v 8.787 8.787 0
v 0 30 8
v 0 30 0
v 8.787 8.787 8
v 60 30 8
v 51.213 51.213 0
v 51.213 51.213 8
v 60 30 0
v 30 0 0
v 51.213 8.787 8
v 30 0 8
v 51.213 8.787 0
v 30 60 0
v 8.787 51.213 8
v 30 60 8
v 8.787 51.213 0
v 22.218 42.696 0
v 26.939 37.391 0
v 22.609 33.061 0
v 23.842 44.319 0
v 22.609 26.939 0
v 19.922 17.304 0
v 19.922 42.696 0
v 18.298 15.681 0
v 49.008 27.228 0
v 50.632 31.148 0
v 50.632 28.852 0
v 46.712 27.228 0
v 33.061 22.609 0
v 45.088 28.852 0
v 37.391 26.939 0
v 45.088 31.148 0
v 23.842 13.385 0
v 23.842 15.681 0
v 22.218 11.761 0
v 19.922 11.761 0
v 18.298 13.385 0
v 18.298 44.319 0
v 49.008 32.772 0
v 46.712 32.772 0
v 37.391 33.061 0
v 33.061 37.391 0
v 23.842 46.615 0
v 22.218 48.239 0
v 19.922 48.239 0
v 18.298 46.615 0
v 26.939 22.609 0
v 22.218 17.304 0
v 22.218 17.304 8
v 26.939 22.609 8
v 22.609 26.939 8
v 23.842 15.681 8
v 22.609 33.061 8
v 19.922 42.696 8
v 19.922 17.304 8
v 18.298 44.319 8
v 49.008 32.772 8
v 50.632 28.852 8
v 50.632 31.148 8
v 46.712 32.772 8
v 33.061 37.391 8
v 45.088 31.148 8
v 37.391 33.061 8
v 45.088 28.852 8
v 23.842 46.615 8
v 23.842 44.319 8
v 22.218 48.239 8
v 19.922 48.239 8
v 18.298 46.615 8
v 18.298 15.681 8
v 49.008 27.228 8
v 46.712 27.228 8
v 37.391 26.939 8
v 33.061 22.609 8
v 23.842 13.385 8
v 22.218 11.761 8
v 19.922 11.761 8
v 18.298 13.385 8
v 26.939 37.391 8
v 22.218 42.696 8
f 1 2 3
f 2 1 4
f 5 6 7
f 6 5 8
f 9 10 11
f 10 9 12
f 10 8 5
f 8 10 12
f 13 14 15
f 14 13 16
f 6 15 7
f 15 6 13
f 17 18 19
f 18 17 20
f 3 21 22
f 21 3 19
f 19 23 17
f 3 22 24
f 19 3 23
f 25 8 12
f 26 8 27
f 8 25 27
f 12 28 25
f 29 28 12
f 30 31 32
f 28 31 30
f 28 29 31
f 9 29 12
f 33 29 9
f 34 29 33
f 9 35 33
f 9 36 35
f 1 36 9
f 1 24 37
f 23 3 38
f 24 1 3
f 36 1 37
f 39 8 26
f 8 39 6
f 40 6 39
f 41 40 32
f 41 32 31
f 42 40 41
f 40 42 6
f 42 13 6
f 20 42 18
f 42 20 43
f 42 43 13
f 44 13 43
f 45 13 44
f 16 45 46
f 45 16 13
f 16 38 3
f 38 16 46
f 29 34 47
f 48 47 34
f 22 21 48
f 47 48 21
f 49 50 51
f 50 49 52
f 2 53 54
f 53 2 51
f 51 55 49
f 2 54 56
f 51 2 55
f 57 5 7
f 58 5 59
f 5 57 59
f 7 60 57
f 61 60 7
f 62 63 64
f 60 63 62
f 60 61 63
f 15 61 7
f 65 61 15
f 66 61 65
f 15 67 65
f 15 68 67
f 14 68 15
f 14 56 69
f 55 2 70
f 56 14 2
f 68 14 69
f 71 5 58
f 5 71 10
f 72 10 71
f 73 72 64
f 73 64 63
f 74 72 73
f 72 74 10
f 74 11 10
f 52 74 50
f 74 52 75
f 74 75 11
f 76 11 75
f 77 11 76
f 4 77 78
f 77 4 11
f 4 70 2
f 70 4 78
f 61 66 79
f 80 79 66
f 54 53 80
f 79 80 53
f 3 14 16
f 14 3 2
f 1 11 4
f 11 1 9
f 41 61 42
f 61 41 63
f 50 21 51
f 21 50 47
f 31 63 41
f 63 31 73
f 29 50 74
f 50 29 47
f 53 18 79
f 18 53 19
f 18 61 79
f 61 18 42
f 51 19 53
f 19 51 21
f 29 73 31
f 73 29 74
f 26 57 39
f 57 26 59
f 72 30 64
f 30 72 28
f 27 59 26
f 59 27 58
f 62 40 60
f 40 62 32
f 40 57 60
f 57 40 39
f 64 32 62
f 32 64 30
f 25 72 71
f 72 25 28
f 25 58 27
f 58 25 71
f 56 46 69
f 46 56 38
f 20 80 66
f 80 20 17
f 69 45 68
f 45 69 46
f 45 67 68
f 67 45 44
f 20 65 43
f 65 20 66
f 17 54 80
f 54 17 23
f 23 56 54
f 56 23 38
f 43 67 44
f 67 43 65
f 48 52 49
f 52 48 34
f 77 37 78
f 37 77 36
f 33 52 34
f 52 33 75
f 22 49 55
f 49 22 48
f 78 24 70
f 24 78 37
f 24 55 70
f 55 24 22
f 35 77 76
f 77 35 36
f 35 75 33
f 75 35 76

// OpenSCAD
$fn = 32;

// ----------------------------------------------------------------------
// Polygon plate: 8-gon R30, 3 bolt windows
// ----------------------------------------------------------------------

// --- parameters (mm) ---
sides = 8;                // number of polygon sides
plate_r = 30;             // circumscribed radius of the polygon
bore_r = 8;               // centre bore radius
bolts = 3;                // number of bolt windows
ring_r = 17.86;           // bolt-circle radius
bolt_r = 3;               // bolt window radius
plate_t = 8;              // plate thickness, Z (extrusion height)

plate_d = 2 * plate_r;  // circumscribed diameter
bore_d = 2 * bore_r;  // centre bore diameter
bolt_d = 2 * bolt_r;  // bolt window diameter
ring_d = 2 * ring_r;  // bolt-circle diameter

profile = [[60, 30], [51.213, 51.213], [30, 60], [8.787, 51.213], [0, 30], [8.787, 8.787], [30, 0], [51.213, 8.787]];  // primary outline, 8 points, counter clockwise
void_1 = [[37.391, 33.061], [33.061, 37.391], [26.939, 37.391], [22.609, 33.061], [22.609, 26.939], [26.939, 22.609], [33.061, 22.609], [37.391, 26.939]];  // centre bore, 8 points
void_2 = [[50.632, 31.148], [49.008, 32.772], [46.712, 32.772], [45.088, 31.148], [45.088, 28.852], [46.712, 27.228], [49.008, 27.228], [50.632, 28.852]];  // bolt window 1, 8 points
void_3 = [[23.842, 46.615], [22.218, 48.239], [19.922, 48.239], [18.298, 46.615], [18.298, 44.319], [19.922, 42.696], [22.218, 42.696], [23.842, 44.319]];  // bolt window 2, 8 points
void_4 = [[23.842, 15.681], [22.218, 17.304], [19.922, 17.304], [18.298, 15.681], [18.298, 13.385], [19.922, 11.761], [22.218, 11.761], [23.842, 13.385]];  // bolt window 3, 8 points

// --- the one profile operation ---
difference() {
  linear_extrude(height = plate_t) polygon(points = profile);
  translate([0, 0, -1])
    linear_extrude(height = plate_t + 2) polygon(points = void_1);
  translate([0, 0, -1])
    linear_extrude(height = plate_t + 2) polygon(points = void_2);
  translate([0, 0, -1])
    linear_extrude(height = plate_t + 2) polygon(points = void_3);
  translate([0, 0, -1])
    linear_extrude(height = plate_t + 2) polygon(points = void_4);
}
